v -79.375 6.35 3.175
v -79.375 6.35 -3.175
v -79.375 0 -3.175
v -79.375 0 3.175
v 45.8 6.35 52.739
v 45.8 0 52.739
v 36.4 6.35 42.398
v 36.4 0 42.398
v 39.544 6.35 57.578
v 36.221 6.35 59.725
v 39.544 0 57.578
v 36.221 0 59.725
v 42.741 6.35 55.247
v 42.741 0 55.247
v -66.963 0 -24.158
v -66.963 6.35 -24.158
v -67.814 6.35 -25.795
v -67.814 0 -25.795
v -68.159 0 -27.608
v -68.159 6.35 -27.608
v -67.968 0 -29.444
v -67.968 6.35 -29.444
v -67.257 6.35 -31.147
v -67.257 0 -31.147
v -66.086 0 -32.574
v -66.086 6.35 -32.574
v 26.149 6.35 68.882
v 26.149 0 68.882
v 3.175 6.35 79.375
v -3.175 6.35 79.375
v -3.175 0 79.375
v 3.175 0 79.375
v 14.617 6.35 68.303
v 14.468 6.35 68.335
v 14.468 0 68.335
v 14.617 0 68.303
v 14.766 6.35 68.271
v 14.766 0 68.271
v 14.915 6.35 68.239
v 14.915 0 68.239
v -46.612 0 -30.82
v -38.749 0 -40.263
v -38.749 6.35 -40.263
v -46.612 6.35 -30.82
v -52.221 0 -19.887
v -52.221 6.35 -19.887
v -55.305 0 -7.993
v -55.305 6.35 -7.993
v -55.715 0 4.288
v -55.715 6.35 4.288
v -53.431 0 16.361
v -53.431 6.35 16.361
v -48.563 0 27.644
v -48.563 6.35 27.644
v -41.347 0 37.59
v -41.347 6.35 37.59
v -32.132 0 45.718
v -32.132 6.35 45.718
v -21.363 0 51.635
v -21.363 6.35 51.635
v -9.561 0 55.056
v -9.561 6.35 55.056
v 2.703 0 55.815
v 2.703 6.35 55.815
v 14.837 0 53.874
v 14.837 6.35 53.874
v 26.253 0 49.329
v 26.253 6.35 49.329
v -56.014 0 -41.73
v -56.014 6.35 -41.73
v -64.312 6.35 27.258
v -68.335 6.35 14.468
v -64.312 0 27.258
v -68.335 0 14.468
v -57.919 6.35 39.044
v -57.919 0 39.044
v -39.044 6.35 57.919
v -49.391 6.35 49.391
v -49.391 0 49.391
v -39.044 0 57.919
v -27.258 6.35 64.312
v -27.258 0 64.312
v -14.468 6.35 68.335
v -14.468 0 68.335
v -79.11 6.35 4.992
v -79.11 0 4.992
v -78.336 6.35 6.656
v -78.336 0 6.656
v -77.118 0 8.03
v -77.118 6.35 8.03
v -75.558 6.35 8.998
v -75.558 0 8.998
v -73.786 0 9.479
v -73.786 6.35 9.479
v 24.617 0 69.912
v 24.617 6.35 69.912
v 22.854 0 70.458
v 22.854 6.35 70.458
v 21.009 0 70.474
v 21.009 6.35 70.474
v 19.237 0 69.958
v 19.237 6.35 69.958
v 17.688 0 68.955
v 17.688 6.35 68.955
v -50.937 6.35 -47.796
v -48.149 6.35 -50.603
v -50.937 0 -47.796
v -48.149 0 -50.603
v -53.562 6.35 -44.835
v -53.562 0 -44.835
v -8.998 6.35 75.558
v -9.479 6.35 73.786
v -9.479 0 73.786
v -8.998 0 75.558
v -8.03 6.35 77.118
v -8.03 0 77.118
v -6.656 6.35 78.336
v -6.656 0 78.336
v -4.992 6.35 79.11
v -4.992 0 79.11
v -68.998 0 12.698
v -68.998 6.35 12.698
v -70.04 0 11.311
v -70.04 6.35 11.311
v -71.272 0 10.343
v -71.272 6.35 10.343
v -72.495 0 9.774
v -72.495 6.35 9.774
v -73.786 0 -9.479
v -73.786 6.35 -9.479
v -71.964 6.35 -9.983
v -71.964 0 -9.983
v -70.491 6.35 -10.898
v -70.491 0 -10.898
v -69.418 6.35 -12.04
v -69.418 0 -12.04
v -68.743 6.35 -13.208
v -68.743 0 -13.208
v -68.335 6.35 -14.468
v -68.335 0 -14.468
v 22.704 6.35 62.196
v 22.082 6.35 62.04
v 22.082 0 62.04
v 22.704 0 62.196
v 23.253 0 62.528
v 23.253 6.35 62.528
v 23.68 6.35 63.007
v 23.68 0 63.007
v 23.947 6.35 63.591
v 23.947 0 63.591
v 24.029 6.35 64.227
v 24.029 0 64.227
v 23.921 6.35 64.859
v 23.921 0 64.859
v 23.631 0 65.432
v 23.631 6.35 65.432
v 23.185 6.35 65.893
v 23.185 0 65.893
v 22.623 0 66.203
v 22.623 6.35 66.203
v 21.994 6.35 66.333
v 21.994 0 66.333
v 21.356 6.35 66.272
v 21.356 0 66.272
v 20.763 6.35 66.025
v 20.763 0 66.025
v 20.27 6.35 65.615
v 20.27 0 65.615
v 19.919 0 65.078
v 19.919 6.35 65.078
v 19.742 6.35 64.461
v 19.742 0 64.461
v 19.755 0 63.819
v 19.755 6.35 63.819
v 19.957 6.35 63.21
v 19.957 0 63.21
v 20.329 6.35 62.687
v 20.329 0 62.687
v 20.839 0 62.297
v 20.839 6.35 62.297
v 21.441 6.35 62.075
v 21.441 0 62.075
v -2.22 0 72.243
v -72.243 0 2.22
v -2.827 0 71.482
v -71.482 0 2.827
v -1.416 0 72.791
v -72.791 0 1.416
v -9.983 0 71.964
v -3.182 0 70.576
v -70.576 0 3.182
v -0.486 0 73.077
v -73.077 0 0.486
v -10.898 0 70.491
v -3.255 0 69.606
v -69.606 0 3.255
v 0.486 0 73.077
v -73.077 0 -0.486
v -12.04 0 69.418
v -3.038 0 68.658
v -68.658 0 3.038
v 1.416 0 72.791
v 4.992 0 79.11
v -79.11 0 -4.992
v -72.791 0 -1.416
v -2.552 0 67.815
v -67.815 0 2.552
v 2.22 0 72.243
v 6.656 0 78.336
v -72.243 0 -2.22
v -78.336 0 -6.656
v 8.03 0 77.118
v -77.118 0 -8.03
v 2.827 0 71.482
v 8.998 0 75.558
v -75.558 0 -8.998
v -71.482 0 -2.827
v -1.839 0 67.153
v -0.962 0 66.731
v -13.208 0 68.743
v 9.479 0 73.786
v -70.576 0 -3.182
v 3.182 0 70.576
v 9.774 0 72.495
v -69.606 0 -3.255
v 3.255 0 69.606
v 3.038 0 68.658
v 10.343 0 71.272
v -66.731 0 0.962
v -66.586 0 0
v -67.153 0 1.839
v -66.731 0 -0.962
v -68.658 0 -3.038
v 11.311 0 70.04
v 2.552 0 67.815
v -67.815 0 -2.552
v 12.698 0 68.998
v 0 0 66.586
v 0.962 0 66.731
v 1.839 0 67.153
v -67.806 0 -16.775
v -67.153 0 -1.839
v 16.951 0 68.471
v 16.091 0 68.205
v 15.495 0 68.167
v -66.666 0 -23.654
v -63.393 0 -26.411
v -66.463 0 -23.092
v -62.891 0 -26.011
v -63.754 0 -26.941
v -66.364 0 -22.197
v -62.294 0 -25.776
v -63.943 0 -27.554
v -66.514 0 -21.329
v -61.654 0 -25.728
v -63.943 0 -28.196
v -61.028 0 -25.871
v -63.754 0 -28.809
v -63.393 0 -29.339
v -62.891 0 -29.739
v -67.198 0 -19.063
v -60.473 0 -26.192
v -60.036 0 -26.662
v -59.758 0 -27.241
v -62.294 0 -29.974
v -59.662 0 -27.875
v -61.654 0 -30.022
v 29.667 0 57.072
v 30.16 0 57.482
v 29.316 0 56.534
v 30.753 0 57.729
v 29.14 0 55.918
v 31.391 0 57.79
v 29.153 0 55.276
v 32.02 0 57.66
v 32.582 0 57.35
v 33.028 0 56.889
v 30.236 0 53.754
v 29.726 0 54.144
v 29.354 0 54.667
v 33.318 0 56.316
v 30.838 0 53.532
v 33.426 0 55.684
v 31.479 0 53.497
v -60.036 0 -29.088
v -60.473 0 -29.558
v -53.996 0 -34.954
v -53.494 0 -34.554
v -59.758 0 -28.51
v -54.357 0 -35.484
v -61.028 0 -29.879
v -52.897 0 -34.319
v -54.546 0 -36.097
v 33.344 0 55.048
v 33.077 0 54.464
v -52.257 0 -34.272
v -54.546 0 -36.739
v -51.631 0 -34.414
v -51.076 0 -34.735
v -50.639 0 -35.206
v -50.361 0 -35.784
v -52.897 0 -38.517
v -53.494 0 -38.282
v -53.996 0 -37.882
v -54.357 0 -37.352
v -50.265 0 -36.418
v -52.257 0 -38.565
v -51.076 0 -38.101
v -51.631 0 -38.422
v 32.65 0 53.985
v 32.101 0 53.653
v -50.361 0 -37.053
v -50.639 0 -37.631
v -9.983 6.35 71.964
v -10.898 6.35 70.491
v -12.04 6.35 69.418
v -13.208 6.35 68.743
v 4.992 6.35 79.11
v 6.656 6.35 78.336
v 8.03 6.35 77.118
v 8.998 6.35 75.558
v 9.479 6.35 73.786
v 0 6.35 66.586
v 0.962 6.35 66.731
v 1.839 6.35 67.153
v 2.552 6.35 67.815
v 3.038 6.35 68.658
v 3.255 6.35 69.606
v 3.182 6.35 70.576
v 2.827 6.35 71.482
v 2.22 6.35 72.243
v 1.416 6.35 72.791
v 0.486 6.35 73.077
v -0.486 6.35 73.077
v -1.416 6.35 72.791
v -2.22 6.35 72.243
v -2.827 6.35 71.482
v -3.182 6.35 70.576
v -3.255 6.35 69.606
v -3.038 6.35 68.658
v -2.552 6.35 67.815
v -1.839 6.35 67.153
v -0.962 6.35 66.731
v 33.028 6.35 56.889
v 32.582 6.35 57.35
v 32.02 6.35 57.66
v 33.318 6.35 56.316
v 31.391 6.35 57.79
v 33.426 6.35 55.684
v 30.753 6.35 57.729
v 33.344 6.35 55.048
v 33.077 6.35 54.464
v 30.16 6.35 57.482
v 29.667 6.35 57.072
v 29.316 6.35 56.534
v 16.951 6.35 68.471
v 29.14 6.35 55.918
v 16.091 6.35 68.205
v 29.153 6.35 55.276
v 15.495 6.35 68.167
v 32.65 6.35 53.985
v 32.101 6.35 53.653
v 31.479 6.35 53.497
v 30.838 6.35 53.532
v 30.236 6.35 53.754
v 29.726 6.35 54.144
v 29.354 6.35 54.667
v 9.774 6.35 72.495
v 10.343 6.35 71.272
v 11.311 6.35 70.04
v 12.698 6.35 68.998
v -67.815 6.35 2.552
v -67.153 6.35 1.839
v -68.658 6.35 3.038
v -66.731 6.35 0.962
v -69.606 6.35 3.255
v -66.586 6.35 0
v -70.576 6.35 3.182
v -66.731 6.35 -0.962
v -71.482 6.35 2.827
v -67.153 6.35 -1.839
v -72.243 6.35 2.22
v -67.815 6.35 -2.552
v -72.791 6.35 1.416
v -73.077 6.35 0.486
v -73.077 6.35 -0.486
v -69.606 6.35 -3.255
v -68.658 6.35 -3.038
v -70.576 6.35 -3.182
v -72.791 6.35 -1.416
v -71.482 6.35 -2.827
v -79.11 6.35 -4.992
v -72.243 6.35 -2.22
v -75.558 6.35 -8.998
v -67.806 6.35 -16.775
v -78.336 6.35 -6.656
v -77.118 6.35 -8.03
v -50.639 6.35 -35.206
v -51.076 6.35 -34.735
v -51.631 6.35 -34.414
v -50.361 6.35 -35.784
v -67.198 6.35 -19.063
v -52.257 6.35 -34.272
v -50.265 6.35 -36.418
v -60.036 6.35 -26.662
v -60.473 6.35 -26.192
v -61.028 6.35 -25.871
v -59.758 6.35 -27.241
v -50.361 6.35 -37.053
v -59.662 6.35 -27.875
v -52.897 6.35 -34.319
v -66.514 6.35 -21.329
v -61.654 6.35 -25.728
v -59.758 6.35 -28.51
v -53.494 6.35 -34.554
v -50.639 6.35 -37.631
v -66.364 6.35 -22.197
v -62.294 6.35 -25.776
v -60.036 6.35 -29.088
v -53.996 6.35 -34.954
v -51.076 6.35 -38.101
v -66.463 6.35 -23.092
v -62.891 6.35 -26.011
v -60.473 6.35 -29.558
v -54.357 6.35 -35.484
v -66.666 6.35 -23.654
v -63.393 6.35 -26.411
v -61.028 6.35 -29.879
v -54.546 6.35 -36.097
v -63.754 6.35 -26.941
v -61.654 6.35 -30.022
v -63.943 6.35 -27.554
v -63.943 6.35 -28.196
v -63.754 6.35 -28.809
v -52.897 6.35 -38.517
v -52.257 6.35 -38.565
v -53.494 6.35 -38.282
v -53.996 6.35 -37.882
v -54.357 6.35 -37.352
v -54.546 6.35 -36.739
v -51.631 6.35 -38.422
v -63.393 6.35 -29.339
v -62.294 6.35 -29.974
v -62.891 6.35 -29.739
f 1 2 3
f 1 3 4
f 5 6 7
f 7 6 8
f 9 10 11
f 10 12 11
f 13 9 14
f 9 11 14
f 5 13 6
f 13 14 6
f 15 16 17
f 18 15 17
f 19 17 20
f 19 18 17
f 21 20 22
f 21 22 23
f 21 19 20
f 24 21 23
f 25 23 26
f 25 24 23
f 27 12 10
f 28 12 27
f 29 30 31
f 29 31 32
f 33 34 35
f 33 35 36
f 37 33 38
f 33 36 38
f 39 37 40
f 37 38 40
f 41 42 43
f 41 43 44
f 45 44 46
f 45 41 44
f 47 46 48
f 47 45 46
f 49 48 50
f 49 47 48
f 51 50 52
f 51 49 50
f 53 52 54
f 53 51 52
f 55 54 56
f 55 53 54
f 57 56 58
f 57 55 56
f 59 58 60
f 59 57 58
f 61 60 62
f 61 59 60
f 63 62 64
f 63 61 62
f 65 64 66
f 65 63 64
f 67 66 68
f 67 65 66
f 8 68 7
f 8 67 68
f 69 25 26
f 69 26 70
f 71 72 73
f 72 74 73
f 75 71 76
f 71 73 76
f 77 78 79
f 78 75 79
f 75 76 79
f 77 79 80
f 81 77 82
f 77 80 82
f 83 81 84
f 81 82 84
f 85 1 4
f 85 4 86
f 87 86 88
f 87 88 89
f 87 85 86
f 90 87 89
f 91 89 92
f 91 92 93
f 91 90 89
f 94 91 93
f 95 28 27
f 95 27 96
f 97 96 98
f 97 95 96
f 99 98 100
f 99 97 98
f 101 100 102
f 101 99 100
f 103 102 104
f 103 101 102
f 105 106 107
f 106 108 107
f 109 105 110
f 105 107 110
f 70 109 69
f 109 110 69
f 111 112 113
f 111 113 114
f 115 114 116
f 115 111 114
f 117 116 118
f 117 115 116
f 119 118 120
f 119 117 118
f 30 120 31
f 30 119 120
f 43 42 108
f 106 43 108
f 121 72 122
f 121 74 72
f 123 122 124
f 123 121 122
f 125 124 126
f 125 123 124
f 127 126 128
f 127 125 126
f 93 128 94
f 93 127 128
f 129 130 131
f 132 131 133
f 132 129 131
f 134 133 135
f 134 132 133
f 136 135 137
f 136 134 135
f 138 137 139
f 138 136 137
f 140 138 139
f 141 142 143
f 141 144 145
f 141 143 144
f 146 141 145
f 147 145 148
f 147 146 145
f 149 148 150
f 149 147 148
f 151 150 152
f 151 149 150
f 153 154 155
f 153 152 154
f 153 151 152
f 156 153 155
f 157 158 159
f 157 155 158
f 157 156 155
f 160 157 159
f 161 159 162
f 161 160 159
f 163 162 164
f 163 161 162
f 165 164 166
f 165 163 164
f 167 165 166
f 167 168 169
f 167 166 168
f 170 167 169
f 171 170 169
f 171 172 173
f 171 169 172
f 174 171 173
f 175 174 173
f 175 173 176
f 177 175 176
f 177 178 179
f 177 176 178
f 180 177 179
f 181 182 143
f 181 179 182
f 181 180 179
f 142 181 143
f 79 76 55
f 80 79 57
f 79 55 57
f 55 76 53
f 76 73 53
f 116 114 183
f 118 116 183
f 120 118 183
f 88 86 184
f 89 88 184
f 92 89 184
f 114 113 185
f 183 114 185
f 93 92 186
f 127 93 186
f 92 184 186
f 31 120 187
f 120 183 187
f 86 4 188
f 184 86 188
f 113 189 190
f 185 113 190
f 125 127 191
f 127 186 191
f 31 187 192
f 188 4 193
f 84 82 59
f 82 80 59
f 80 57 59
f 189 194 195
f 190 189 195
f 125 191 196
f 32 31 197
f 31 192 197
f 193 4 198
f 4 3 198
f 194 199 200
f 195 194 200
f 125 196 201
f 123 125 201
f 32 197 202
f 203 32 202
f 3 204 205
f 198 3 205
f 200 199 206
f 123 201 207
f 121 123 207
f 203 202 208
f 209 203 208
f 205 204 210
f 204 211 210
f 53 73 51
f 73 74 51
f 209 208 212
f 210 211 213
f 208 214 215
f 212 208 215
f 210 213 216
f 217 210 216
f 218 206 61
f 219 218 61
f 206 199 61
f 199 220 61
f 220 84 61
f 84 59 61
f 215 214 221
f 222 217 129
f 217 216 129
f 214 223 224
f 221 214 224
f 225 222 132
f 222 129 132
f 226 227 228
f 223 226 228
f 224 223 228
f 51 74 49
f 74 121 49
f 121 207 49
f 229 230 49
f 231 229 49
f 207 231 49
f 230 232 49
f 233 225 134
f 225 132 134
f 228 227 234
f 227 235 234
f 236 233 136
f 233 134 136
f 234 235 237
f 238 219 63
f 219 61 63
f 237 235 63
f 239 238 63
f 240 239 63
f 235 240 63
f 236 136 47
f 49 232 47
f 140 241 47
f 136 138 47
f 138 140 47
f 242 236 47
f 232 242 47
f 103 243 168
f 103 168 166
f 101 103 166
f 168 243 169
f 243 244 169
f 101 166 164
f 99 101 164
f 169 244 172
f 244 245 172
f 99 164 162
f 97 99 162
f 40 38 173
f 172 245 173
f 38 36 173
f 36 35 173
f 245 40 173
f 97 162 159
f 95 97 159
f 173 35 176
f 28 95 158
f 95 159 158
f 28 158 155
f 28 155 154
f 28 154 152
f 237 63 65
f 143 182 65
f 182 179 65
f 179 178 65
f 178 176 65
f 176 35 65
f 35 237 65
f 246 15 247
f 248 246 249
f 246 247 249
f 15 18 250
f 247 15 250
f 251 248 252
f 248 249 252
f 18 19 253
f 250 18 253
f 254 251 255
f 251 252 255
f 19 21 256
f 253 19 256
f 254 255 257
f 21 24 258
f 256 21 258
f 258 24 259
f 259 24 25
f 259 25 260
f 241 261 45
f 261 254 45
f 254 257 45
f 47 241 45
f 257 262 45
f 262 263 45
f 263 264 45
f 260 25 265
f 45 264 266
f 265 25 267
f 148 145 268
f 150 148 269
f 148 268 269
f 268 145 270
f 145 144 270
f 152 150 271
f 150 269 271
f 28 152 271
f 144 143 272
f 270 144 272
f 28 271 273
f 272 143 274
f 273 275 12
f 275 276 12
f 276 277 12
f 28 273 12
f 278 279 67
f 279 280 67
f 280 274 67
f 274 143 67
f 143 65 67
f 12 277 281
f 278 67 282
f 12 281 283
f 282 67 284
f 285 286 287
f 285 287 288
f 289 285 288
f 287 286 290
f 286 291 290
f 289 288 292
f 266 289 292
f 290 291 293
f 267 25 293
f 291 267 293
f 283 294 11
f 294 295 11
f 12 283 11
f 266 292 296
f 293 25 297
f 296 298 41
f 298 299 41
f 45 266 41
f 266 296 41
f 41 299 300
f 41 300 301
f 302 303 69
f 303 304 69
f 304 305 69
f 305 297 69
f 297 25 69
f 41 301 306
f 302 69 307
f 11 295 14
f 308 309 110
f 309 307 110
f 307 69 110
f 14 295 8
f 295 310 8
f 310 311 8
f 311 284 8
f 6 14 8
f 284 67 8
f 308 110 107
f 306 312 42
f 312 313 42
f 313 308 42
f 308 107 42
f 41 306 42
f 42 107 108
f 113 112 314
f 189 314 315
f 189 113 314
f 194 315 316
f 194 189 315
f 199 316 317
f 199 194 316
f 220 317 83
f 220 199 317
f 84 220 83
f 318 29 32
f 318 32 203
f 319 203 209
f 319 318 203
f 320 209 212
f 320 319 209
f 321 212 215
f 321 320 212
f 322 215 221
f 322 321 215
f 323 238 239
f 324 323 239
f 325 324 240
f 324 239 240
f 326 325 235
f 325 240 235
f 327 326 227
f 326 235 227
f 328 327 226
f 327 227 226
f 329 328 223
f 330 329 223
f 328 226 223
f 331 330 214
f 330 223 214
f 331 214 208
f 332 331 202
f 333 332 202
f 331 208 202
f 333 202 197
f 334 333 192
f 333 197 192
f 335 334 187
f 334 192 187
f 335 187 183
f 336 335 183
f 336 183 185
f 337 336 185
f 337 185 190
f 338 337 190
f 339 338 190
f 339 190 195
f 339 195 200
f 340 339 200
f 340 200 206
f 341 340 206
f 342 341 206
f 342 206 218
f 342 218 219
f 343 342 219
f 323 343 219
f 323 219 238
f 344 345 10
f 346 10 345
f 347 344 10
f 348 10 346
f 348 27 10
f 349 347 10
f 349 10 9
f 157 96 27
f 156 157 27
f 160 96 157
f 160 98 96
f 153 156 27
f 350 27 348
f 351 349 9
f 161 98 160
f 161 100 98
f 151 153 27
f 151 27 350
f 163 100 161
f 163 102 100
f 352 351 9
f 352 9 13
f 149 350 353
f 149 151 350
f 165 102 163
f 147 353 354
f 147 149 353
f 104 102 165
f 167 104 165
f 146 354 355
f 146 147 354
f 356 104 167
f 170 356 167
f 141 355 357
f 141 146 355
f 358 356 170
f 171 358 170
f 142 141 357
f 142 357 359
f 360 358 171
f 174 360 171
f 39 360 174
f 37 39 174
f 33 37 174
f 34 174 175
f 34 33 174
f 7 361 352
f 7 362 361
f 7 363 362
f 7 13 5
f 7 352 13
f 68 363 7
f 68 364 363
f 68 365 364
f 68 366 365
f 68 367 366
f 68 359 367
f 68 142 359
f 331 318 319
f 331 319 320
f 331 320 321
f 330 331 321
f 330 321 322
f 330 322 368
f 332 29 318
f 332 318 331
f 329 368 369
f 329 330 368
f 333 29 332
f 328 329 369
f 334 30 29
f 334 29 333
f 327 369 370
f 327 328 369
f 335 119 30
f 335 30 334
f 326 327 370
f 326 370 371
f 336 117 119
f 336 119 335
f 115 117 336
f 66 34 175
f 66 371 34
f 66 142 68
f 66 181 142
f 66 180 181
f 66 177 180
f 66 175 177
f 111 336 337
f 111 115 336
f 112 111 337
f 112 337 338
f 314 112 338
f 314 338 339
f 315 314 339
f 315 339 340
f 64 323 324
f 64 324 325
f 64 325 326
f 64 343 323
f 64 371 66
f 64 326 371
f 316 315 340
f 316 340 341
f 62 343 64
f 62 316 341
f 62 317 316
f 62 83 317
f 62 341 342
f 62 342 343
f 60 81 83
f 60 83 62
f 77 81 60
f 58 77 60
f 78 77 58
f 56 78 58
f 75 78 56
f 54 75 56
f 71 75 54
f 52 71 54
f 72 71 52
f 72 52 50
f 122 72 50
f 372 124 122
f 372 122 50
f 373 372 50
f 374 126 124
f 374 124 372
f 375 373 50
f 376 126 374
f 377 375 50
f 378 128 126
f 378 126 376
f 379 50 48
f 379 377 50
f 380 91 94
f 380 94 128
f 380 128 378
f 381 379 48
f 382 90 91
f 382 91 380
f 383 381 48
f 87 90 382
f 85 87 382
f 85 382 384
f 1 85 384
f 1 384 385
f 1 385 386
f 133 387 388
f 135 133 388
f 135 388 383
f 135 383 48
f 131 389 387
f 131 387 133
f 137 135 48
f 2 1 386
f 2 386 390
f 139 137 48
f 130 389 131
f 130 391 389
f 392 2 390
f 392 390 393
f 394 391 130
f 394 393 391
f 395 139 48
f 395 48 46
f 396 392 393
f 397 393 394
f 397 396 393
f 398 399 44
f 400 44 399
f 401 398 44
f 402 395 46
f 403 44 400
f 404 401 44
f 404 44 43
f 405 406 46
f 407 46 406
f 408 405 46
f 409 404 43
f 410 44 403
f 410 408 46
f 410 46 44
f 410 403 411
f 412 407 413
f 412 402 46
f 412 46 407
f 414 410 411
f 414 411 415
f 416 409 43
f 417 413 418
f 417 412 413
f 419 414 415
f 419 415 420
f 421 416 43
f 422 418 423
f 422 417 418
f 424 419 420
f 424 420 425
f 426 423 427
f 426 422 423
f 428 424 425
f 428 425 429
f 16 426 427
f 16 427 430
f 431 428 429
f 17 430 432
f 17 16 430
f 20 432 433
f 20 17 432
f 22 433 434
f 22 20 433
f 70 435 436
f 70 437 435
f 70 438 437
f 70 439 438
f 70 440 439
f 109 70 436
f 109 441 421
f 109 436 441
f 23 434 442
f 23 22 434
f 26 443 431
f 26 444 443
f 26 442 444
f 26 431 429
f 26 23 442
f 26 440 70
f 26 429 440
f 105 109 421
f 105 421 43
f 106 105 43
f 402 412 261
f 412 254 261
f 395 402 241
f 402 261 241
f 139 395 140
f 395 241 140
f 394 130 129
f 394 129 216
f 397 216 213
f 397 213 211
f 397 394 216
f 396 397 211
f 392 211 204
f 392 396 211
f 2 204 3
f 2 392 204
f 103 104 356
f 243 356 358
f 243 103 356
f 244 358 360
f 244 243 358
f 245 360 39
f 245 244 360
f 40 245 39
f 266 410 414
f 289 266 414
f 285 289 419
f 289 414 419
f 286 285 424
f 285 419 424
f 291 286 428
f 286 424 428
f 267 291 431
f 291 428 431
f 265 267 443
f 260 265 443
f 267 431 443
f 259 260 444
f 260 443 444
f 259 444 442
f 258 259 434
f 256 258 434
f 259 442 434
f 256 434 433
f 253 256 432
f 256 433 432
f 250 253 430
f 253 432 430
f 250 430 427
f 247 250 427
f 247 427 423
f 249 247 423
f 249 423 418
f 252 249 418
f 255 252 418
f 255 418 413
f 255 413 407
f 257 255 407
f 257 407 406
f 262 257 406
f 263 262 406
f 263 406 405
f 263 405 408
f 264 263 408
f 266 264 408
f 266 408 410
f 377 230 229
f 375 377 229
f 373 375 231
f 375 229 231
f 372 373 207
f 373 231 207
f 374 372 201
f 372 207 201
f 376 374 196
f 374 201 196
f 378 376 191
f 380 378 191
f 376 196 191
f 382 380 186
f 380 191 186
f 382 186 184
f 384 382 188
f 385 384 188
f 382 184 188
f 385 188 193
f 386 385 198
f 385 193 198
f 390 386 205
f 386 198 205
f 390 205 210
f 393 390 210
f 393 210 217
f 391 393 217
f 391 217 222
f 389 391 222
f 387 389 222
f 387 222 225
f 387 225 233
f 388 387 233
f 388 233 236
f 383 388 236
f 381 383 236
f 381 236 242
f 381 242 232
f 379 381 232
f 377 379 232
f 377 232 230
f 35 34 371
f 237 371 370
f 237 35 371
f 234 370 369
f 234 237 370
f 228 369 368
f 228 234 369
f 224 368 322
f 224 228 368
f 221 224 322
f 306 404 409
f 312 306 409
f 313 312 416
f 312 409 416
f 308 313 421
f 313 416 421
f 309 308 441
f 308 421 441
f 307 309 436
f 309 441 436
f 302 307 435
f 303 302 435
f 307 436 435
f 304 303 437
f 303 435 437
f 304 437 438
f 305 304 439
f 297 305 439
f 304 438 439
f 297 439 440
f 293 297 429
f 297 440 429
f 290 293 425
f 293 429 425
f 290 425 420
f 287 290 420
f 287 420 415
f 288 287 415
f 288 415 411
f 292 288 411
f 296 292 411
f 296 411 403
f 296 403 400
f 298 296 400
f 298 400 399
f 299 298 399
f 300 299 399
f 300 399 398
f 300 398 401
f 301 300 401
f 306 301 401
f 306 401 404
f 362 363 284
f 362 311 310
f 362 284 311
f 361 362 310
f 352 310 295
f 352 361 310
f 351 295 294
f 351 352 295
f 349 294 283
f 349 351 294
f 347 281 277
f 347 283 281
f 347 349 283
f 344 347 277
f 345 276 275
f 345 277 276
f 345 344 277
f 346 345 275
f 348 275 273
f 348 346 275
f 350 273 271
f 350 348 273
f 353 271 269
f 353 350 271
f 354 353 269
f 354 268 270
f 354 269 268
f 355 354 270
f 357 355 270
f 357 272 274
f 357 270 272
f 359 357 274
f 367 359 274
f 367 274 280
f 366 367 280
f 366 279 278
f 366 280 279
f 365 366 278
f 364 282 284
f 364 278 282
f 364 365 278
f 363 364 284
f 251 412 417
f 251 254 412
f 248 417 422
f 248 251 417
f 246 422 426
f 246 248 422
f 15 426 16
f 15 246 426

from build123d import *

# Parameters (mm, degrees)
SKETCH1_R                    = 69.85
SKETCH1_R_2                  = 55.88
BOSS_EXTRUDE1_DEPTH          = 6.35
BOSS_EXTRUDE2_DEPTH          = 6.35
FILLET1_R                    = 6.35
CIRPATTERN2_COUNT            = 4
FILLET1_OF_CIRPATTERN2_R     = 6.35
F_0_257_DIAMETER_HOLE1_D     = 6.5278
CIRPATTERN1_COUNT            = 4
SKETCH6_R                    = 3.2639
CUT_EXTRUDE1_DEPTH           = 7.3500001
BOSS_EXTRUDE4_DEPTH          = 6.35
FILLET3_R                    = 3.175
F_18_0_1695_DIAMETER_HOLE1_D = 4.3053


with BuildPart() as part:
    # Sketch1 → Boss-Extrude1 (new body)
    with BuildSketch(Plane(origin=(0, 0, 0), x_dir=(1, 0, 0), z_dir=(0, 1, 0))):
        Circle(SKETCH1_R)
        Circle(SKETCH1_R_2, mode=Mode.SUBTRACT)
    extrude(amount=BOSS_EXTRUDE1_DEPTH)

    # Sketch5 → Boss-Extrude2 (add)
    with BuildSketch(Plane(origin=(0, 6.35, 0), x_dir=(1, 0, 0), z_dir=(0, 1, 0))):
        with BuildLine():
            Line((-9.525, 63.5), (9.525, 63.5))
            Line((9.525, 63.5), (9.525, 73.025))
            ThreePointArc((9.525, 73.025), (7.665128061, 77.515128061), (3.175, 79.375))
            Line((3.175, 79.375), (-3.175, 79.375))
            ThreePointArc((-3.175, 79.375), (-7.665128061, 77.515128061), (-9.525, 73.025))
            Line((-9.525, 73.025), (-9.525, 63.5))
        make_face()
    boss_extrude2 = extrude(amount=-BOSS_EXTRUDE2_DEPTH)

    # Fillet1
    fillet1_edges = [part.edges().sort_by_distance(p)[0] for p in [
        (9.525, 3.175, -69.197520729),
        (-9.525, 3.175, -69.197520729),
    ]]
    fillet(fillet1_edges, radius=FILLET1_R)

    # CirPattern2: Boss-Extrude2 ×4 about axis
    cirpattern2_axis = Axis((0, 0, 0), (0, 1, 0))
    for i in range(1, CIRPATTERN2_COUNT):
        add(boss_extrude2.rotate(cirpattern2_axis, i * 360 / CIRPATTERN2_COUNT))

    # Fillet1 of CirPattern2
    fillet1_of_cirpattern2_edges = [part.edges().sort_by_distance(p)[0] for p in [
        (-69.197520729, 3.175, -9.525),
        (-69.197520729, 3.175, 9.525),
        (-9.525, 3.175, 69.197520729),
        (9.525, 3.175, 69.197520729),
        (69.197520729, 3.175, 9.525),
        (69.197520729, 3.175, -9.525),
    ]]
    fillet(fillet1_of_cirpattern2_edges, radius=FILLET1_OF_CIRPATTERN2_R)

    # F (0.257) Diameter Hole1 (through all)
    with Locations(Plane(origin=(0, 6.35, 0), x_dir=(1, 0, 0), z_dir=(0, 1, 0))):
        with Locations((69.85, 0)):
            f_0_257_diameter_hole1 = Hole(F_0_257_DIAMETER_HOLE1_D / 2)

    # CirPattern1: F (0.257) Diameter Hole1 ×4 about axis
    cirpattern1_axis = Axis((0, 0, 0), (0, 1, 0))
    for i in range(1, CIRPATTERN1_COUNT):
        add(f_0_257_diameter_hole1.rotate(cirpattern1_axis, i * 360 / CIRPATTERN1_COUNT), mode=Mode.SUBTRACT)

    # Sketch6 → Cut-Extrude1 (cut, through all)
    with BuildSketch(Plane.XZ):
        with BuildLine():
            Line((-38.749062578, -40.262694263), (-48.149496878, -50.60285022))
            ThreePointArc((-48.149496878, -50.60285022), (-46.98699519, -51.684086361), (-45.800220226, -52.738622728))
            Line((-45.800220226, -52.738622728), (-36.399785925, -42.398466772))
            ThreePointArc((-36.399785925, -42.398466772), (-37.589596152, -41.347269089), (-38.749062578, -40.262694263))
        make_face()
        with BuildLine():
            Line((-36.399785925, -42.398466772), (-45.800220226, -52.738622728))
            ThreePointArc((-45.800220226, -52.738622728), (-31.12686289, -62.531119506), (-14.468129908, -68.335171888))
            add(Edge.make_bspline(
                [(-14.468129908, -68.335171888), (-14.283432872, -68.374276505), (-14.099232, -68.420160929), (-13.915921077, -68.472867364), (-13.733896872, -68.532401891), (-13.553556281, -68.598733654), (-13.249844138, -68.723208999), (-13.125423196, -68.77795645), (-13.002168013, -68.83601258), (-12.88021375, -68.897344809), (-12.759693358, -68.961911786), (-12.355694209, -69.192010649), (-12.079622266, -69.372650227), (-11.814338628, -69.570883737), (-11.56151572, -69.78574391), (-11.322668236, -70.016027336), (-10.782274905, -70.606478562), (-10.496090022, -70.980818219), (-10.244386574, -71.379158998), (-10.029870298, -71.796677829), (-9.854233948, -72.228125174), (-9.660927551, -72.851945664), (-9.610789898, -73.037441883), (-9.567571656, -73.224014536), (-9.531268493, -73.411265552), (-9.501839293, -73.598800252), (-9.479207222, -73.786230121)],
                knots=[0, 0, 0, 0, 0, 0, 0, 0.147493178, 0.147493178, 0.147493178, 0.147493178, 0.147493178, 0.251288922, 0.251288922, 0.251288922, 0.251288922, 0.251288922, 0.500005624, 0.500005624, 0.500005624, 0.500005624, 0.500005624, 0.852506427, 0.852506427, 0.852506427, 0.852506427, 0.852506427, 1, 1, 1, 1, 1, 1, 1], degree=6))
            ThreePointArc((-9.479207222, -73.786230121), (-7.387403633, -77.776647676), (-3.175, -79.375))
            Line((-3.175, -79.375), (3.175, -79.375))
            ThreePointArc((3.175, -79.375), (7.387403633, -77.776647676), (9.479207222, -73.786230121))
            add(Edge.make_bspline(
                [(14.468129908, -68.335171888), (14.283432872, -68.374276505), (14.099232, -68.420160929), (13.915921077, -68.472867364), (13.733896872, -68.532401891), (13.553556281, -68.598733654), (13.249844138, -68.723208999), (13.125423196, -68.77795645), (13.002168013, -68.83601258), (12.88021375, -68.897344809), (12.759693358, -68.961911786), (12.355694209, -69.192010649), (12.079622266, -69.372650227), (11.814338628, -69.570883737), (11.56151572, -69.78574391), (11.322668236, -70.016027336), (10.782274905, -70.606478562), (10.496090022, -70.980818219), (10.244386574, -71.379158998), (10.029870298, -71.796677829), (9.854233948, -72.228125174), (9.660927551, -72.851945664), (9.610789898, -73.037441883), (9.567571656, -73.224014536), (9.531268493, -73.411265552), (9.501839293, -73.598800252), (9.479207222, -73.786230121)],
                knots=[0, 0, 0, 0, 0, 0, 0, 0.147493178, 0.147493178, 0.147493178, 0.147493178, 0.147493178, 0.251288922, 0.251288922, 0.251288922, 0.251288922, 0.251288922, 0.500005624, 0.500005624, 0.500005624, 0.500005624, 0.500005624, 0.852506427, 0.852506427, 0.852506427, 0.852506427, 0.852506427, 1, 1, 1, 1, 1, 1, 1], degree=6))
            ThreePointArc((14.468129908, -68.335171888), (49.391408666, -49.391408666), (68.335171888, -14.468129908))
            add(Edge.make_bspline(
                [(68.335171888, -14.468129908), (68.374276505, -14.283432872), (68.420160929, -14.099232), (68.472867364, -13.915921077), (68.532401891, -13.733896872), (68.598733654, -13.553556281), (68.846403967, -12.949256038), (69.059475497, -12.535015212), (69.310044177, -12.138083802), (69.595960031, -11.763541247), (69.914101744, -11.415952673), (70.50455297, -10.875559342), (70.762813807, -10.667280882), (71.033632627, -10.475600201), (71.315394329, -10.301582166), (71.606347562, -10.146042489), (72.029097801, -9.952540464), (72.154851861, -9.898875057), (72.281748365, -9.84855844), (72.409651228, -9.801620057), (72.53842294, -9.758080416), (72.851945664, -9.660927551), (73.037441883, -9.610789898), (73.224014536, -9.567571656), (73.411265552, -9.531268493), (73.598800252, -9.501839293), (73.786230121, -9.479207222)],
                knots=[0, 0, 0, 0, 0, 0, 0, 0.147493573, 0.147493573, 0.147493573, 0.147493573, 0.147493573, 0.499994376, 0.499994376, 0.499994376, 0.499994376, 0.499994376, 0.748711078, 0.748711078, 0.748711078, 0.748711078, 0.748711078, 0.852506822, 0.852506822, 0.852506822, 0.852506822, 0.852506822, 1, 1, 1, 1, 1, 1, 1], degree=6))
            ThreePointArc((73.786230121, -9.479207222), (77.776647676, -7.387403633), (79.375, -3.175))
            Line((79.375, -3.175), (79.375, 3.175))
            ThreePointArc((79.375, 3.175), (77.776647676, 7.387403633), (73.786230121, 9.479207222))
            add(Edge.make_bspline(
                [(68.335171888, 14.468129908), (68.374276505, 14.283432872), (68.420160929, 14.099232), (68.472867364, 13.915921077), (68.532401891, 13.733896872), (68.598733654, 13.553556281), (68.846403967, 12.949256038), (69.059475497, 12.535015212), (69.310044177, 12.138083802), (69.595960031, 11.763541247), (69.914101744, 11.415952673), (70.50455297, 10.875559342), (70.762813807, 10.667280882), (71.033632627, 10.475600201), (71.315394329, 10.301582166), (71.606347562, 10.146042489), (72.029097801, 9.952540464), (72.154851861, 9.898875057), (72.281748365, 9.84855844), (72.409651228, 9.801620057), (72.53842294, 9.758080416), (72.851945664, 9.660927551), (73.037441883, 9.610789898), (73.224014536, 9.567571656), (73.411265552, 9.531268493), (73.598800252, 9.501839293), (73.786230121, 9.479207222)],
                knots=[0, 0, 0, 0, 0, 0, 0, 0.147493573, 0.147493573, 0.147493573, 0.147493573, 0.147493573, 0.499994376, 0.499994376, 0.499994376, 0.499994376, 0.499994376, 0.748711078, 0.748711078, 0.748711078, 0.748711078, 0.748711078, 0.852506822, 0.852506822, 0.852506822, 0.852506822, 0.852506822, 1, 1, 1, 1, 1, 1, 1], degree=6))
            ThreePointArc((68.335171888, 14.468129908), (60.980316639, 34.064989103), (48.149496878, 50.60285022))
            Line((48.149496878, 50.60285022), (38.749062578, 40.262694263))
            ThreePointArc((38.749062578, 40.262694263), (51.419218279, 21.877805913), (55.88, 0))
            ThreePointArc((55.88, 0), (23.329748847, -50.776935894), (-36.399785925, -42.398466772))
        make_face()
        with Locations((0, -69.85)):
            Circle(SKETCH6_R, mode=Mode.SUBTRACT)
        with Locations((69.85, 0)):
            Circle(SKETCH6_R, mode=Mode.SUBTRACT)
        with BuildLine():
            Line((45.800220226, 52.738622728), (36.399785925, 42.398466772))
            ThreePointArc((36.399785925, 42.398466772), (37.589596152, 41.347269089), (38.749062578, 40.262694263))
            Line((38.749062578, 40.262694263), (48.149496878, 50.60285022))
            ThreePointArc((48.149496878, 50.60285022), (46.98699519, 51.684086361), (45.800220226, 52.738622728))
        make_face()
    extrude(amount=-CUT_EXTRUDE1_DEPTH, mode=Mode.SUBTRACT)

    # Sketch8 → Boss-Extrude4 (add)
    with BuildSketch(Plane(origin=(0, 0, 0), x_dir=(-1, 0, 0), z_dir=(0, -1, 0))):
        with BuildLine():
            Line((47.292152613, 49.659800874), (38.749062578, 40.262694263))
            Line((38.749062578, 40.262694263), (62.241829106, 18.904969177))
            Line((62.241829106, 18.904969177), (66.513374123, 23.603522482))
            ThreePointArc((66.513374123, 23.603522482), (68.15763817, 28.177007956), (66.086365835, 32.573620805))
            Line((66.086365835, 32.573620805), (47.292152613, 49.659800874))
        make_face()
        with BuildLine():
            Line((-36.399785925, -42.398466772), (-44.94287596, -51.795573383))
            Line((-44.94287596, -51.795573383), (-26.148662738, -68.881753452))
            ThreePointArc((-26.148662738, -68.881753452), (-21.575177264, -70.526017499), (-17.178564415, -68.454745164))
            Line((-17.178564415, -68.454745164), (-12.907019398, -63.756191858))
            Line((-12.907019398, -63.756191858), (-36.399785925, -42.398466772))
        make_face()
    extrude(amount=-BOSS_EXTRUDE4_DEPTH)

    # Fillet3
    fillet3_edges = [part.edges().sort_by_distance(p)[0] for p in [
        (-65.95747234, 3.175, -22.992049549),
        (16.622662632, 3.175, 67.843272231),
    ]]
    fillet(fillet3_edges, radius=FILLET3_R)

    # #18 (0.1695) Diameter Hole1 (through all)
    with Locations(Plane(origin=(0, 0, 0), x_dir=(-1, 0, 0), z_dir=(0, -1, 0))):
        with Locations((61.814820818, 27.875067499), (52.417714206, 36.418157534)):
            f_18_0_1695_diameter_hole1 = Hole(F_18_0_1695_DIAMETER_HOLE1_D / 2)

    # Mirror8: #18 (0.1695) Diameter Hole1 across plane
    add(f_18_0_1695_diameter_hole1.mirror(Plane(origin=(0, 0, 0), x_dir=(-0.739929654, 0, 0.672684255), z_dir=(-0.672684255, 0, -0.739929654))), mode=Mode.SUBTRACT)


solid = part.part
